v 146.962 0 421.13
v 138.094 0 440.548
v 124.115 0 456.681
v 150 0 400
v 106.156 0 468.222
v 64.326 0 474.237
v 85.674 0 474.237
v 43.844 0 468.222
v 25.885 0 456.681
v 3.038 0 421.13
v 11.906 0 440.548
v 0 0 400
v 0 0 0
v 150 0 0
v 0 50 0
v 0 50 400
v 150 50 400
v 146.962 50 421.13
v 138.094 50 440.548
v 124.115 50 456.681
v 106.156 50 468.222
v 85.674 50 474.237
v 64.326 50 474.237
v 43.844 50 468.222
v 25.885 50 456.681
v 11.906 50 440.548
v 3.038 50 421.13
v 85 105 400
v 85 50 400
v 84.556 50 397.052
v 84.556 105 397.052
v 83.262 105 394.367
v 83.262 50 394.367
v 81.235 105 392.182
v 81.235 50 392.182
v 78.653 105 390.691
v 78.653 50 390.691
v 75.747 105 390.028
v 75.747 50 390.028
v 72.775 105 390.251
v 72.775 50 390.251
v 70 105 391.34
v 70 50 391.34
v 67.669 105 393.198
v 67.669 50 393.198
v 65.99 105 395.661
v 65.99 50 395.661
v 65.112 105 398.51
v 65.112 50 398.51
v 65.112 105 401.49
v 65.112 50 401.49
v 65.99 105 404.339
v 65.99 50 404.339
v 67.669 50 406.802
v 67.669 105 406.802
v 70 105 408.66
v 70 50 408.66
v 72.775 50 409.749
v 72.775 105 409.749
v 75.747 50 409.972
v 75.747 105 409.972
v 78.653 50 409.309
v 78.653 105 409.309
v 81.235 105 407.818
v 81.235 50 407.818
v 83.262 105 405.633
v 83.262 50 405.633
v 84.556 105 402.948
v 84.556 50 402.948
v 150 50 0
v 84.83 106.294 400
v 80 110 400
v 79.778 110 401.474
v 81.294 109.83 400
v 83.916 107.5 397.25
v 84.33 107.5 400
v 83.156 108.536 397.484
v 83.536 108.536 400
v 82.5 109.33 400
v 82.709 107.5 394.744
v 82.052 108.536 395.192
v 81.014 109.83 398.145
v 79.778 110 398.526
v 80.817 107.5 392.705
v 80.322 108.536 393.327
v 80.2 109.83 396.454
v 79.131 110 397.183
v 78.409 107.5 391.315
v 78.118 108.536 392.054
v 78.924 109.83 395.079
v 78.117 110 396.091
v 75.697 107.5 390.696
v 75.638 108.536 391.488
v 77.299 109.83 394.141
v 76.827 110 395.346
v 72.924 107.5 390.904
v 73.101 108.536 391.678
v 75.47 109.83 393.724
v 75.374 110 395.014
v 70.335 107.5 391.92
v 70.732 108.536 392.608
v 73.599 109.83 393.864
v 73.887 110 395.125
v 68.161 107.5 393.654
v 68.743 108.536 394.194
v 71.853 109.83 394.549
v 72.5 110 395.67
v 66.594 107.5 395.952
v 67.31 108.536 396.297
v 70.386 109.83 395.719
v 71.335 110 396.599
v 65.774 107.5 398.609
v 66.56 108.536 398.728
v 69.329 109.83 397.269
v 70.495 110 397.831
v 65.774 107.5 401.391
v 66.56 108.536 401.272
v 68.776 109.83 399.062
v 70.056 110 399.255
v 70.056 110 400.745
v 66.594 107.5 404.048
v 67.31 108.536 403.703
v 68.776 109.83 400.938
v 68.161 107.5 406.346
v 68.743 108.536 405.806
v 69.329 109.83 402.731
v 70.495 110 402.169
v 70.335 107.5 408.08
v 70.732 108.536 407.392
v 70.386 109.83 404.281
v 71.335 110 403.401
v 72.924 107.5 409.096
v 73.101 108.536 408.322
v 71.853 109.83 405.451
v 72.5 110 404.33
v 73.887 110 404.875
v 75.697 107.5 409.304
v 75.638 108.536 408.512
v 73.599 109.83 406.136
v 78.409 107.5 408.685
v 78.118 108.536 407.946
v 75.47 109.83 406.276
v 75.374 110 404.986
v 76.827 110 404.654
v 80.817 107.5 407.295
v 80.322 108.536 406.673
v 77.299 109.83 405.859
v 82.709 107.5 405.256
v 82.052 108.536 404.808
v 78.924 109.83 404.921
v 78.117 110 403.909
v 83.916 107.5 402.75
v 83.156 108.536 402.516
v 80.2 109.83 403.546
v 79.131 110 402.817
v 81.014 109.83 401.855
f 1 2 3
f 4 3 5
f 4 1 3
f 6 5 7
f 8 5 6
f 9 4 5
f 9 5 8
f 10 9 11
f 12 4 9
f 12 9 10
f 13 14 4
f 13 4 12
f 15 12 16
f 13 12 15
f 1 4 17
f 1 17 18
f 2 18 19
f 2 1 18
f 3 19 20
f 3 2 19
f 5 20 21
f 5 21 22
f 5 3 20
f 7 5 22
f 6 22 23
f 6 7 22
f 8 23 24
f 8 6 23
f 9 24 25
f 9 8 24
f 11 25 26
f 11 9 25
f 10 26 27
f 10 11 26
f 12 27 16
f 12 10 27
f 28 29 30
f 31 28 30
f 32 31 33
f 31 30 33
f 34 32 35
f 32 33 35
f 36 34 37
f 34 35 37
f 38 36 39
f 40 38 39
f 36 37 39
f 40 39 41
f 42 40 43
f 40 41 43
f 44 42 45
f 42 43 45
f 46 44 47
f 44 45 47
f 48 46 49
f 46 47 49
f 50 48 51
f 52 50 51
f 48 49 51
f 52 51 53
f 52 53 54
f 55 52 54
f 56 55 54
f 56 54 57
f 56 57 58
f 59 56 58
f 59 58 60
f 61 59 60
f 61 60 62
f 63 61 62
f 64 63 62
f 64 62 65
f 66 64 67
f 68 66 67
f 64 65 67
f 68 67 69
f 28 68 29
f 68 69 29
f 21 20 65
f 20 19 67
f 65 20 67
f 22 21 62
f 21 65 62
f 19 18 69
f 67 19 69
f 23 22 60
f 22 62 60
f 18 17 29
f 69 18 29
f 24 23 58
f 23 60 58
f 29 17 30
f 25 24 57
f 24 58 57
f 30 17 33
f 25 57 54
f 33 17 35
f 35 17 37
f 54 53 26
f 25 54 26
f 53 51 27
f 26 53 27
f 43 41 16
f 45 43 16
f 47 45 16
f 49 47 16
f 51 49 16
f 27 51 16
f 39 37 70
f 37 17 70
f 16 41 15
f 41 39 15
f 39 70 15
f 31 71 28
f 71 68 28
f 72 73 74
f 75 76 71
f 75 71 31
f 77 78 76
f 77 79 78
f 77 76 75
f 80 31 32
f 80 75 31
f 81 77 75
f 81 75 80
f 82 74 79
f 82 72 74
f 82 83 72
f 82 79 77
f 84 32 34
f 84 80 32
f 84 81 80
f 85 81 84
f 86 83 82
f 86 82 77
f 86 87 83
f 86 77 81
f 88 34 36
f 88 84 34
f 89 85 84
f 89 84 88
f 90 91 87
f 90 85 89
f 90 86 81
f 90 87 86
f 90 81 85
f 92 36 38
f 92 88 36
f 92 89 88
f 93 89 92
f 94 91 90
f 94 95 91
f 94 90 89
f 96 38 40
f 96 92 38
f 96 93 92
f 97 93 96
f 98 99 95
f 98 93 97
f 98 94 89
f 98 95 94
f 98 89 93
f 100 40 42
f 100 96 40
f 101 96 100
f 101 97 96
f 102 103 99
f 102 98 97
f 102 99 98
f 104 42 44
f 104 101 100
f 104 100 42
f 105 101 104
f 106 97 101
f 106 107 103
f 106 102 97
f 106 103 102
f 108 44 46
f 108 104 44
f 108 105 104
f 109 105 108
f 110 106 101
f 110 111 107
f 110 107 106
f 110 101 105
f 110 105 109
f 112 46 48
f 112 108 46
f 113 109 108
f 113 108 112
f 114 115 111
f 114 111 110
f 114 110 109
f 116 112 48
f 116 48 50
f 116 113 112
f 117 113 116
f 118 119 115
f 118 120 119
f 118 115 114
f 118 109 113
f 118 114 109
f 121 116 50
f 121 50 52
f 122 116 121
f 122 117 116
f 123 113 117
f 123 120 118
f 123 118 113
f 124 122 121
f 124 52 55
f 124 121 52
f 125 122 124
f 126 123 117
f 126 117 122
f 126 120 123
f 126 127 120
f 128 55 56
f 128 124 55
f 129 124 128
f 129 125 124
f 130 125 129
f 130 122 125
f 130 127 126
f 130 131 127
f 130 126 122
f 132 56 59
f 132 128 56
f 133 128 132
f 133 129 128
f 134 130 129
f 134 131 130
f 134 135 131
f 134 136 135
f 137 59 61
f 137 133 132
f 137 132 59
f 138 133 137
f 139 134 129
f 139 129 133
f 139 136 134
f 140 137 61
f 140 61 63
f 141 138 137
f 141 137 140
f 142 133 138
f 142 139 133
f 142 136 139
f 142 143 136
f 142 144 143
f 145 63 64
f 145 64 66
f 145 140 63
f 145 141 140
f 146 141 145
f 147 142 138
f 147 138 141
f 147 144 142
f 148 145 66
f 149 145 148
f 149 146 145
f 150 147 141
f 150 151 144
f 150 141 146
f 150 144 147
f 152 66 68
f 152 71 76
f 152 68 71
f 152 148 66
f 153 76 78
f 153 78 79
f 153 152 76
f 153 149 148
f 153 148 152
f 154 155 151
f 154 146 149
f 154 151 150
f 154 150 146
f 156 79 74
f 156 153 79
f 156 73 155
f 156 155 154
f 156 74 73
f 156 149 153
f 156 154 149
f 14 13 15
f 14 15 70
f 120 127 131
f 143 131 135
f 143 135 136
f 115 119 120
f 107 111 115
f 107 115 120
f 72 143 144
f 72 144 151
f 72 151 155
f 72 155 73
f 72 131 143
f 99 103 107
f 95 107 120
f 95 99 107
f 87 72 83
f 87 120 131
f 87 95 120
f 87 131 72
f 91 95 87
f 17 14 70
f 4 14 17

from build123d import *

# Parameters (mm, degrees)
EXTRUDE_1_DEPTH = 50
SKETCH_2_R      = 10
EXTRUDE_2_DEPTH = 60
FILLET_1_R      = 5


with BuildPart() as part:
    # 草图1 → 凸台-拉伸1 (new body)
    with BuildSketch(Plane(origin=(0, 0, 0), x_dir=(1, 0, 0), z_dir=(0, 1, 0))):
        with BuildLine():
            Line((0, 0), (150, 0))
            Line((150, 0), (150, -400))
            ThreePointArc((150, -400), (75, -475), (0, -400))
            Line((0, -400), (0, 0))
        make_face()
    extrude(amount=EXTRUDE_1_DEPTH)

    # 草图2 → 凸台-拉伸2 (add)
    with BuildSketch(Plane(origin=(0, 50, 0), x_dir=(1, 0, 0), z_dir=(0, 1, 0))):
        with Locations((75, -400)):
            Circle(SKETCH_2_R)
    extrude(amount=EXTRUDE_2_DEPTH)

    # 圆角1
    fillet_1_edges = [part.edges().sort_by_distance(p)[0] for p in [
        (65, 110, 400),
    ]]
    fillet(fillet_1_edges, radius=FILLET_1_R)


solid = part.part
